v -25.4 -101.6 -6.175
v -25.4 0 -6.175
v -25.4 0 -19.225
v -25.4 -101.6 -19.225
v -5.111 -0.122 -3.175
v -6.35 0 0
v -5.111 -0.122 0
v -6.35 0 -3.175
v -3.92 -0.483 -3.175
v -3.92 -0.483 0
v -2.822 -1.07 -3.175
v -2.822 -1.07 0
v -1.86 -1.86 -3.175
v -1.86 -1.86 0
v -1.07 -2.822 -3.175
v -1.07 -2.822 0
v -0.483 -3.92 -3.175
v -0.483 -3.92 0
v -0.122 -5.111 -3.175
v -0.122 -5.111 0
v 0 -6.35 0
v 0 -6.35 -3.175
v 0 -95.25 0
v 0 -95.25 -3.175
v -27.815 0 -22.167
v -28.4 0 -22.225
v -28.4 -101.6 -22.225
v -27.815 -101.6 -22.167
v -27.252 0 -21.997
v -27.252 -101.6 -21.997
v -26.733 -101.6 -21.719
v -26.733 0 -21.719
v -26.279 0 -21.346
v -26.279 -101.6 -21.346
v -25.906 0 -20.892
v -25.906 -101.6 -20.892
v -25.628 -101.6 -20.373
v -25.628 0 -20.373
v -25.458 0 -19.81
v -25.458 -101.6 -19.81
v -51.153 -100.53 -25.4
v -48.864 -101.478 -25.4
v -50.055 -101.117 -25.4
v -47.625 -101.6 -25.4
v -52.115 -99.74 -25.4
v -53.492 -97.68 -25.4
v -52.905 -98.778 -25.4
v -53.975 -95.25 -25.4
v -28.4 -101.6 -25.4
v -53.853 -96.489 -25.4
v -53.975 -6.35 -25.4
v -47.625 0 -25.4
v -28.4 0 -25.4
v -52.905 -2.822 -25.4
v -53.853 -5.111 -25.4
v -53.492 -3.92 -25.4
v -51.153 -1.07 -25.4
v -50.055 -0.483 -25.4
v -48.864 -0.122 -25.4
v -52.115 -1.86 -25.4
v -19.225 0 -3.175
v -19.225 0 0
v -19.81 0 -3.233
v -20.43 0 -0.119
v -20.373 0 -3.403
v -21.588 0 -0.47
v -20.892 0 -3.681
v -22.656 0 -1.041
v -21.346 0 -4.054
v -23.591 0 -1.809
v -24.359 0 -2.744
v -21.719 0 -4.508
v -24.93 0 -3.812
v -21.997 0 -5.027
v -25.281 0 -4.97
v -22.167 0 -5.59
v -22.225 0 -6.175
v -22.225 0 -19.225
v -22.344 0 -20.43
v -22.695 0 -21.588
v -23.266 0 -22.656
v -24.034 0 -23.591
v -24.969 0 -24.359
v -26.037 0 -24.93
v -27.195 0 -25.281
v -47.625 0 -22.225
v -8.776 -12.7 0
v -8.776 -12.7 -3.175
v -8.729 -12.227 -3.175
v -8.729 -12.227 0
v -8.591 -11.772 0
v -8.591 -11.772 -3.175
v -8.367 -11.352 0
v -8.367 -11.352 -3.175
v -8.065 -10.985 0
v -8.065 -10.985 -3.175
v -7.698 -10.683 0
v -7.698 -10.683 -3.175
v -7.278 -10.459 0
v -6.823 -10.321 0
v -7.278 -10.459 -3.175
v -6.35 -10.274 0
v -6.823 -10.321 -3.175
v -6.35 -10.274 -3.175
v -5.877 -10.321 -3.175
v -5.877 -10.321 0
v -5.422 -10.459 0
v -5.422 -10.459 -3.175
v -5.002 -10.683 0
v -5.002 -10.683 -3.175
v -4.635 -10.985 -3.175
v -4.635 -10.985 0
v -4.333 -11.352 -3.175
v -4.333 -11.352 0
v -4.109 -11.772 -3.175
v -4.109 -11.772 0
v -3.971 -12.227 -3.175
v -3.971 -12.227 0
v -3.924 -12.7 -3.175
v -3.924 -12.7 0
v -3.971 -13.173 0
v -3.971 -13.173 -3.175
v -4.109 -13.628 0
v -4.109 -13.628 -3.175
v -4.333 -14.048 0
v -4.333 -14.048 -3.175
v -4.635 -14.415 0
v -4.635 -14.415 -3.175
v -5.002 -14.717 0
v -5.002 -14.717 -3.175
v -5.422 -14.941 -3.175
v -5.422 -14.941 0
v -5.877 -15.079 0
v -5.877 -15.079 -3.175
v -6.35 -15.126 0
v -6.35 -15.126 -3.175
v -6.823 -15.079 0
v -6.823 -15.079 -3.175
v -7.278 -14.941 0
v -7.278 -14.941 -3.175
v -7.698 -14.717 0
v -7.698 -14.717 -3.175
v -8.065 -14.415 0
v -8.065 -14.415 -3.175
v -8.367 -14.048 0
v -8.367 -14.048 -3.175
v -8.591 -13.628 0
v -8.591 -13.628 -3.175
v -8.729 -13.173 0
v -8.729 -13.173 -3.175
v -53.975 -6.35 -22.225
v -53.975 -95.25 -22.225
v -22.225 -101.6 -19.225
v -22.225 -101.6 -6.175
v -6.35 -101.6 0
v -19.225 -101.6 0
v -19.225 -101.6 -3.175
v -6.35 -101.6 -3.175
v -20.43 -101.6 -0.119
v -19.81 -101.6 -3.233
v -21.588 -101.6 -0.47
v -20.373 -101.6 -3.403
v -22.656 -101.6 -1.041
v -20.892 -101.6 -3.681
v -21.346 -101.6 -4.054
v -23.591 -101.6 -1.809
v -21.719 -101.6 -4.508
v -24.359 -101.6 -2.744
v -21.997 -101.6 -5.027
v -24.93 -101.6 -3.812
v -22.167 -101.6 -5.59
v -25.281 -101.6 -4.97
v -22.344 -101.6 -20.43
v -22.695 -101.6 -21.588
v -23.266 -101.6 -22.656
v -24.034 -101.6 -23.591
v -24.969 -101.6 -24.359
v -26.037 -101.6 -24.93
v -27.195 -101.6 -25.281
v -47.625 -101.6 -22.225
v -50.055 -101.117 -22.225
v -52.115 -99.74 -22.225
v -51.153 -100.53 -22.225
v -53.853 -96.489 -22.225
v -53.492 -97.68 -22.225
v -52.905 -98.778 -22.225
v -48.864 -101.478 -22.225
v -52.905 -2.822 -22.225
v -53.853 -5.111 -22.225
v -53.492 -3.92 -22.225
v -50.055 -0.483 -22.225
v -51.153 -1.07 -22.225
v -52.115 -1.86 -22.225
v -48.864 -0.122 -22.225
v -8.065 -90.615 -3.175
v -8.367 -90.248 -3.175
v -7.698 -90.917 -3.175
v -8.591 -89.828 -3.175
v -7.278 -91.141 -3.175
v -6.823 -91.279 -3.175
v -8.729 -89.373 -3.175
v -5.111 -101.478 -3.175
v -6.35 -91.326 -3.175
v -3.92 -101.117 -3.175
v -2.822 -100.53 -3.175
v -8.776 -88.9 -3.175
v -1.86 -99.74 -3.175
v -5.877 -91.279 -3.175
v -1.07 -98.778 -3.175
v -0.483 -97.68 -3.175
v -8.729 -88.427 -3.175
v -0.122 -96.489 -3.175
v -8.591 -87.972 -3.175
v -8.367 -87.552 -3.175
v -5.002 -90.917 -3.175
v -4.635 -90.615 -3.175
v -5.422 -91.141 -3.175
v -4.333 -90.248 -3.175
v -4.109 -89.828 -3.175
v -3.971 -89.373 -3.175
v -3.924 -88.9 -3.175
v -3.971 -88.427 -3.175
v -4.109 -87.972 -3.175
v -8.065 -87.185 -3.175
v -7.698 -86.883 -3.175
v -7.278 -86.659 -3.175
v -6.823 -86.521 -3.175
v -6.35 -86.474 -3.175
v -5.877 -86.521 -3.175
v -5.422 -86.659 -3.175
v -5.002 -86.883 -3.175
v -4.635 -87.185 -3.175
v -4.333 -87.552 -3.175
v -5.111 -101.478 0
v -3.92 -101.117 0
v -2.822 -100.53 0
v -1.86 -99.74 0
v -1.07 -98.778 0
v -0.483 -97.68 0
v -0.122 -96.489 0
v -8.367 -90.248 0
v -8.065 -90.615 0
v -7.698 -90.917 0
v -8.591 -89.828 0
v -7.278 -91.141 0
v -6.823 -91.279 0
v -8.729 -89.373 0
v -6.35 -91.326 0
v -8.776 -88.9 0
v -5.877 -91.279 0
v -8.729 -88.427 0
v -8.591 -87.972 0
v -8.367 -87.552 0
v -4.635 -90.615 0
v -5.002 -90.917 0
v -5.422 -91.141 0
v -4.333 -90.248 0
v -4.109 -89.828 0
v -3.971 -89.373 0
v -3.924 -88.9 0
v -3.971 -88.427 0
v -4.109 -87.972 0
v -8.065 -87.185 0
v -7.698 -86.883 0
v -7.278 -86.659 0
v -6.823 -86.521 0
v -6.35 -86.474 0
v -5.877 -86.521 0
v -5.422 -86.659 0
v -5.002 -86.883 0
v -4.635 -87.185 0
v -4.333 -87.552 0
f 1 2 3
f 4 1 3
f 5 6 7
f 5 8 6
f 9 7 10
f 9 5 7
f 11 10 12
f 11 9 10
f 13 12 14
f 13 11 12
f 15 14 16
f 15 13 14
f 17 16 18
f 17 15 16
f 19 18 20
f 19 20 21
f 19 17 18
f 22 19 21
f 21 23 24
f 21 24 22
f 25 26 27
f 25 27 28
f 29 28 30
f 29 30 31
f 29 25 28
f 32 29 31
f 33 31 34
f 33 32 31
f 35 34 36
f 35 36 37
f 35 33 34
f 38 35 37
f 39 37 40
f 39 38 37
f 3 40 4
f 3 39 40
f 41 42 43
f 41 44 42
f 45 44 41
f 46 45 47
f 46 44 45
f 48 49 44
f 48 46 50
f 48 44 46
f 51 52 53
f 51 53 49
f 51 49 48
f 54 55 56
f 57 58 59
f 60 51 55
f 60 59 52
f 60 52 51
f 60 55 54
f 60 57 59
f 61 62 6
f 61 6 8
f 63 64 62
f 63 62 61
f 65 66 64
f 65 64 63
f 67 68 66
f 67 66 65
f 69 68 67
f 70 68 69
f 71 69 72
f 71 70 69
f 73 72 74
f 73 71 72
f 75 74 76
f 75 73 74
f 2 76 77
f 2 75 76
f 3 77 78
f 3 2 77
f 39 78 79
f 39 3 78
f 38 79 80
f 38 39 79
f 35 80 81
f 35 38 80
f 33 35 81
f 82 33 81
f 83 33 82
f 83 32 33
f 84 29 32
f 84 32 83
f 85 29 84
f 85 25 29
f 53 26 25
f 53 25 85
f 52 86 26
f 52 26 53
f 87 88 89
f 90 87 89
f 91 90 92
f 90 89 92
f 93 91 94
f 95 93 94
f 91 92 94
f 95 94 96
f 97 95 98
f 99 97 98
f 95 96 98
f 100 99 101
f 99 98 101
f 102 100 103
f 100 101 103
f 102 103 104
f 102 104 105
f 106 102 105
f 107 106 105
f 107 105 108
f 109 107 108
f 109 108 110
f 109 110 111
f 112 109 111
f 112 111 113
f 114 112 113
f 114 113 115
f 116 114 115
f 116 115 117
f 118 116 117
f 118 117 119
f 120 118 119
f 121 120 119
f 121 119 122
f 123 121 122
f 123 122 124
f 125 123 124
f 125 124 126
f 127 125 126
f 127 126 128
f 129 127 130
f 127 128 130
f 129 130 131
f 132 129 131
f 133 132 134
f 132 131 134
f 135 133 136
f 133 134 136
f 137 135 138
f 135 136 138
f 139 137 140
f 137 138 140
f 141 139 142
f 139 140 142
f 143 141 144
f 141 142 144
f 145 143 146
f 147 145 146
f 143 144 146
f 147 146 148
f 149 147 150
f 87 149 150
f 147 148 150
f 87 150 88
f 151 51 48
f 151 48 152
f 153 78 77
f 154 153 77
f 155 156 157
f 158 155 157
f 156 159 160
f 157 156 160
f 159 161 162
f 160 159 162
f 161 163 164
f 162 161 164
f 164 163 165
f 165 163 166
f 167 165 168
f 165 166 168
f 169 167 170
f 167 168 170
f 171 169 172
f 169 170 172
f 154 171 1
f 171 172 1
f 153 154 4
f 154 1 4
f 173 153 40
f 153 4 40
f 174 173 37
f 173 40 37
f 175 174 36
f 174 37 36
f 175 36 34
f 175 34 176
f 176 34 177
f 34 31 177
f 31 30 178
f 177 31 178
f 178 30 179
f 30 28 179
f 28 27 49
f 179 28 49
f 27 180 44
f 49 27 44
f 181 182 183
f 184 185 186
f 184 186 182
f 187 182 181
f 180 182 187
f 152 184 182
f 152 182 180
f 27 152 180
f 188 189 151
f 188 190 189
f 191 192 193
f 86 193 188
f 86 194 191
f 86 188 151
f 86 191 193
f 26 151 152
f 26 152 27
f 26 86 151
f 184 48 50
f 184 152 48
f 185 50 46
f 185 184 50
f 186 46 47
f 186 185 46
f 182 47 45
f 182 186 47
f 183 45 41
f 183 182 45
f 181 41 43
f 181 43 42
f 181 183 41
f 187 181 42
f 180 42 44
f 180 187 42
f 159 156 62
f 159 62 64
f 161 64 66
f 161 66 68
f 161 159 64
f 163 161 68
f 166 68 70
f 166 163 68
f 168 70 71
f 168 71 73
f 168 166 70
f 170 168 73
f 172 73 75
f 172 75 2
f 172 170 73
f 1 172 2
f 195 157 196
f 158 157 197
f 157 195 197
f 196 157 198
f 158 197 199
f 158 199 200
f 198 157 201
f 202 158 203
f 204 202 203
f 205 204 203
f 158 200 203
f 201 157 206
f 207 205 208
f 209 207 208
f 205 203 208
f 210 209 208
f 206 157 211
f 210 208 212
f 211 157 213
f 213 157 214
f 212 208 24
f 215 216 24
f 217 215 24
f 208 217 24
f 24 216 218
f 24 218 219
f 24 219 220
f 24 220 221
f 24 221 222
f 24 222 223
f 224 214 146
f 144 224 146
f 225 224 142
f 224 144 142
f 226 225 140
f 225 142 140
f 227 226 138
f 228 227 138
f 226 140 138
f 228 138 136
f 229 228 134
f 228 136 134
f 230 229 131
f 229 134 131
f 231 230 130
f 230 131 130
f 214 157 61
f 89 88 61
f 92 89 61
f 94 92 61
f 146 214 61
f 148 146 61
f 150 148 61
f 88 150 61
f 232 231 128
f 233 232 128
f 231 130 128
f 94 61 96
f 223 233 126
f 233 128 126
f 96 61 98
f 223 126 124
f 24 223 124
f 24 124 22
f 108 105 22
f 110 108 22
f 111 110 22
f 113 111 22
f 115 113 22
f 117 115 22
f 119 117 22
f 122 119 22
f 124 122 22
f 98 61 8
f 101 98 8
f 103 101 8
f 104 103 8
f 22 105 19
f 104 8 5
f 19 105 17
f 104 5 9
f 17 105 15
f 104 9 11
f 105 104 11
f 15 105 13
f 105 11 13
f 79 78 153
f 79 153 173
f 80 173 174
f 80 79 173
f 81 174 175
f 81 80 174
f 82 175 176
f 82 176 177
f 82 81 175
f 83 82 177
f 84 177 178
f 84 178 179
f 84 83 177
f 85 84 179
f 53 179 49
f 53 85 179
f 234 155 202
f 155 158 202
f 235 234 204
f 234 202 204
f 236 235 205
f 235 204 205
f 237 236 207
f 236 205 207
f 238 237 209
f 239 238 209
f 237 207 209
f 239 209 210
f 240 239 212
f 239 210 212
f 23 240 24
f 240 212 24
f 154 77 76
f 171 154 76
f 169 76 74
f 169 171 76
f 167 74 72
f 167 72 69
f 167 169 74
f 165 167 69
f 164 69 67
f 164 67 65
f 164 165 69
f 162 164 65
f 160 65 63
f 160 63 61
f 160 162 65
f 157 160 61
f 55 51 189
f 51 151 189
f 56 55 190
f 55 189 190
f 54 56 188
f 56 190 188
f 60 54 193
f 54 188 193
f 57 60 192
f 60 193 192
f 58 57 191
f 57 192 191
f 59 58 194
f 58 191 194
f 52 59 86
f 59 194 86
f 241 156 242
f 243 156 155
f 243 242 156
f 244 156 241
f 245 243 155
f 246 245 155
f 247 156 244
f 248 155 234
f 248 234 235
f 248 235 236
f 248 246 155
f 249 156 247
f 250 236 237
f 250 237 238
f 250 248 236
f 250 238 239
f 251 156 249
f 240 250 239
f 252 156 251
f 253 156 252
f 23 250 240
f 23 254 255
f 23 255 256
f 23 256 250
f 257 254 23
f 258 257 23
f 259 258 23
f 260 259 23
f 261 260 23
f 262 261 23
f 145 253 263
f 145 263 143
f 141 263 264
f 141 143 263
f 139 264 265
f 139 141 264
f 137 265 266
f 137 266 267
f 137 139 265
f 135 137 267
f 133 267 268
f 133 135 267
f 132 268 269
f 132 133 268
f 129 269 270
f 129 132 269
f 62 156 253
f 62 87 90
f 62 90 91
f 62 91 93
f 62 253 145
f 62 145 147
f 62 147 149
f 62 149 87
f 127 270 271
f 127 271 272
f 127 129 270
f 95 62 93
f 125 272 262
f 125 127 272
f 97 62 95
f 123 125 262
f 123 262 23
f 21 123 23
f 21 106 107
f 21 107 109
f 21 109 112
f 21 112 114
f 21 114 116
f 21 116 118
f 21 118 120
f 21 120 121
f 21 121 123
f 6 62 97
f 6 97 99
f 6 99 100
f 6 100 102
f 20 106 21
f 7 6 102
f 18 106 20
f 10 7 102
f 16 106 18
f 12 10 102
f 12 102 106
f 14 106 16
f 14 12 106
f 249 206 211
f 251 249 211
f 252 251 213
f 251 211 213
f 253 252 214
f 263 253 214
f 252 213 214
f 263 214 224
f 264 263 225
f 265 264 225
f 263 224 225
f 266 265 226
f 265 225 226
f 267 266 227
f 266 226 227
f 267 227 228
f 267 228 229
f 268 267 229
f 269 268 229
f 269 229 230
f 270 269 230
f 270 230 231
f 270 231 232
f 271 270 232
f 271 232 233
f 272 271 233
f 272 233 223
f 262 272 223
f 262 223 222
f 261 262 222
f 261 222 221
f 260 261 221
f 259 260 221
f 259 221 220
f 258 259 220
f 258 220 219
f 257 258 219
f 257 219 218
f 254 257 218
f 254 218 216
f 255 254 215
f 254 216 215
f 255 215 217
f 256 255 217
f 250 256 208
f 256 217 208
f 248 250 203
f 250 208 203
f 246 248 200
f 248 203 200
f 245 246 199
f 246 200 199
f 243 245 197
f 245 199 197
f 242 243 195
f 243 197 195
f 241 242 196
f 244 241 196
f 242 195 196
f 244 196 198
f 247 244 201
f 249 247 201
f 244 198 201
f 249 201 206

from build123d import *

# Parameters (mm, degrees)
SKETCH1_W                    = 25.4
SKETCH1_H                    = 101.6
BASE_FLANGE1_DEPTH           = 3.175
EDGE_FLANGE1_STRIP_W         = 18.7
EDGE_FLANGE1_STRIP_H         = 3.175
EDGE_FLANGE1_STRIP_CUT_DEPTH = 101.6
EDGE_FLANGE1_DEPTH           = 101.6
EDGE_FLANGE2_STRIP_W         = 18.7
EDGE_FLANGE2_STRIP_H         = 3.175
EDGE_FLANGE2_STRIP_CUT_DEPTH = 101.6
EDGE_FLANGE2_DEPTH           = 101.6
F_11_0_191_DIAMETER_HOLE1_D  = 4.8514
FILLET1_R                    = 6.35


# Sheet-metal steps are written as plain solids
with BuildPart() as part:
    # Sketch1 → Base-Flange1 (new body)
    with BuildSketch(Plane.XY):
        with Locations((-12.7, -50.8)):
            Rectangle(SKETCH1_W, SKETCH1_H)
    extrude(amount=-BASE_FLANGE1_DEPTH)

    # Edge-Flange1 strip (across the edge) → Edge-Flange1 strip cut (cut)
    with BuildSketch(Plane(origin=(-25.4, -101.6, -3.175), x_dir=(1, 0, 0), z_dir=(0, 1, 0))):
        with Locations((-3.175, -1.5875)):
            Rectangle(EDGE_FLANGE1_STRIP_W, EDGE_FLANGE1_STRIP_H)
    extrude(amount=EDGE_FLANGE1_STRIP_CUT_DEPTH, mode=Mode.SUBTRACT)

    # Edge-Flange1 section (across the edge) → Edge-Flange1 (add)
    with BuildSketch(Plane(origin=(-25.4, -101.6, -3.175), x_dir=(1, 0, 0), z_dir=(0, 1, 0))):
        with BuildLine():
            Line((0, 3), (0, 19.05))
            Line((0, 19.05), (3.175, 19.05))
            Line((3.175, 19.05), (3.175, 3))
            ThreePointArc((3.175, 3), (4.053679656, 0.878679656), (6.175, 0))
            Line((6.175, 0), (6.175, -3.175))
            ThreePointArc((6.175, -3.175), (1.808615626, -1.366384374), (0, 3))
        make_face()
    extrude(amount=EDGE_FLANGE1_DEPTH)

    # Edge-Flange2 strip (across the edge) → Edge-Flange2 strip cut (cut)
    with BuildSketch(Plane(origin=(-25.4, 0, -22.225), x_dir=(0, 0, 1), z_dir=(0, -1, 0))):
        with Locations((-6.35, -1.5875)):
            Rectangle(EDGE_FLANGE2_STRIP_W, EDGE_FLANGE2_STRIP_H)
    extrude(amount=EDGE_FLANGE2_STRIP_CUT_DEPTH, mode=Mode.SUBTRACT)

    # Edge-Flange2 section (across the edge) → Edge-Flange2 (add)
    with BuildSketch(Plane(origin=(-25.4, 0, -22.225), x_dir=(0, 0, 1), z_dir=(0, -1, 0))):
        with BuildLine():
            Line((-3.175, 3), (-3.175, 28.575))
            Line((-3.175, 28.575), (0, 28.575))
            Line((0, 28.575), (0, 3))
            ThreePointArc((0, 3), (0.878679656, 0.878679656), (3, 0))
            Line((3, 0), (3, -3.175))
            ThreePointArc((3, -3.175), (-1.366384374, -1.366384374), (-3.175, 3))
        make_face()
    extrude(amount=EDGE_FLANGE2_DEPTH)

    # #11 (0.191) Diameter Hole1 (through all)
    with Locations(Plane.XY):
        with Locations((-6.35, -12.7), (-6.35, -88.9)):
            Hole(F_11_0_191_DIAMETER_HOLE1_D / 2)

    # Fillet1
    fillet1_edges = [part.edges().sort_by_distance(p)[0] for p in [
        (-53.975, 0, -23.8125),
        (-53.975, -101.6, -23.8125),
        (0, -101.6, -1.5875),
        (0, 0, -1.5875),
    ]]
    fillet(fillet1_edges, radius=FILLET1_R)


solid = part.part
